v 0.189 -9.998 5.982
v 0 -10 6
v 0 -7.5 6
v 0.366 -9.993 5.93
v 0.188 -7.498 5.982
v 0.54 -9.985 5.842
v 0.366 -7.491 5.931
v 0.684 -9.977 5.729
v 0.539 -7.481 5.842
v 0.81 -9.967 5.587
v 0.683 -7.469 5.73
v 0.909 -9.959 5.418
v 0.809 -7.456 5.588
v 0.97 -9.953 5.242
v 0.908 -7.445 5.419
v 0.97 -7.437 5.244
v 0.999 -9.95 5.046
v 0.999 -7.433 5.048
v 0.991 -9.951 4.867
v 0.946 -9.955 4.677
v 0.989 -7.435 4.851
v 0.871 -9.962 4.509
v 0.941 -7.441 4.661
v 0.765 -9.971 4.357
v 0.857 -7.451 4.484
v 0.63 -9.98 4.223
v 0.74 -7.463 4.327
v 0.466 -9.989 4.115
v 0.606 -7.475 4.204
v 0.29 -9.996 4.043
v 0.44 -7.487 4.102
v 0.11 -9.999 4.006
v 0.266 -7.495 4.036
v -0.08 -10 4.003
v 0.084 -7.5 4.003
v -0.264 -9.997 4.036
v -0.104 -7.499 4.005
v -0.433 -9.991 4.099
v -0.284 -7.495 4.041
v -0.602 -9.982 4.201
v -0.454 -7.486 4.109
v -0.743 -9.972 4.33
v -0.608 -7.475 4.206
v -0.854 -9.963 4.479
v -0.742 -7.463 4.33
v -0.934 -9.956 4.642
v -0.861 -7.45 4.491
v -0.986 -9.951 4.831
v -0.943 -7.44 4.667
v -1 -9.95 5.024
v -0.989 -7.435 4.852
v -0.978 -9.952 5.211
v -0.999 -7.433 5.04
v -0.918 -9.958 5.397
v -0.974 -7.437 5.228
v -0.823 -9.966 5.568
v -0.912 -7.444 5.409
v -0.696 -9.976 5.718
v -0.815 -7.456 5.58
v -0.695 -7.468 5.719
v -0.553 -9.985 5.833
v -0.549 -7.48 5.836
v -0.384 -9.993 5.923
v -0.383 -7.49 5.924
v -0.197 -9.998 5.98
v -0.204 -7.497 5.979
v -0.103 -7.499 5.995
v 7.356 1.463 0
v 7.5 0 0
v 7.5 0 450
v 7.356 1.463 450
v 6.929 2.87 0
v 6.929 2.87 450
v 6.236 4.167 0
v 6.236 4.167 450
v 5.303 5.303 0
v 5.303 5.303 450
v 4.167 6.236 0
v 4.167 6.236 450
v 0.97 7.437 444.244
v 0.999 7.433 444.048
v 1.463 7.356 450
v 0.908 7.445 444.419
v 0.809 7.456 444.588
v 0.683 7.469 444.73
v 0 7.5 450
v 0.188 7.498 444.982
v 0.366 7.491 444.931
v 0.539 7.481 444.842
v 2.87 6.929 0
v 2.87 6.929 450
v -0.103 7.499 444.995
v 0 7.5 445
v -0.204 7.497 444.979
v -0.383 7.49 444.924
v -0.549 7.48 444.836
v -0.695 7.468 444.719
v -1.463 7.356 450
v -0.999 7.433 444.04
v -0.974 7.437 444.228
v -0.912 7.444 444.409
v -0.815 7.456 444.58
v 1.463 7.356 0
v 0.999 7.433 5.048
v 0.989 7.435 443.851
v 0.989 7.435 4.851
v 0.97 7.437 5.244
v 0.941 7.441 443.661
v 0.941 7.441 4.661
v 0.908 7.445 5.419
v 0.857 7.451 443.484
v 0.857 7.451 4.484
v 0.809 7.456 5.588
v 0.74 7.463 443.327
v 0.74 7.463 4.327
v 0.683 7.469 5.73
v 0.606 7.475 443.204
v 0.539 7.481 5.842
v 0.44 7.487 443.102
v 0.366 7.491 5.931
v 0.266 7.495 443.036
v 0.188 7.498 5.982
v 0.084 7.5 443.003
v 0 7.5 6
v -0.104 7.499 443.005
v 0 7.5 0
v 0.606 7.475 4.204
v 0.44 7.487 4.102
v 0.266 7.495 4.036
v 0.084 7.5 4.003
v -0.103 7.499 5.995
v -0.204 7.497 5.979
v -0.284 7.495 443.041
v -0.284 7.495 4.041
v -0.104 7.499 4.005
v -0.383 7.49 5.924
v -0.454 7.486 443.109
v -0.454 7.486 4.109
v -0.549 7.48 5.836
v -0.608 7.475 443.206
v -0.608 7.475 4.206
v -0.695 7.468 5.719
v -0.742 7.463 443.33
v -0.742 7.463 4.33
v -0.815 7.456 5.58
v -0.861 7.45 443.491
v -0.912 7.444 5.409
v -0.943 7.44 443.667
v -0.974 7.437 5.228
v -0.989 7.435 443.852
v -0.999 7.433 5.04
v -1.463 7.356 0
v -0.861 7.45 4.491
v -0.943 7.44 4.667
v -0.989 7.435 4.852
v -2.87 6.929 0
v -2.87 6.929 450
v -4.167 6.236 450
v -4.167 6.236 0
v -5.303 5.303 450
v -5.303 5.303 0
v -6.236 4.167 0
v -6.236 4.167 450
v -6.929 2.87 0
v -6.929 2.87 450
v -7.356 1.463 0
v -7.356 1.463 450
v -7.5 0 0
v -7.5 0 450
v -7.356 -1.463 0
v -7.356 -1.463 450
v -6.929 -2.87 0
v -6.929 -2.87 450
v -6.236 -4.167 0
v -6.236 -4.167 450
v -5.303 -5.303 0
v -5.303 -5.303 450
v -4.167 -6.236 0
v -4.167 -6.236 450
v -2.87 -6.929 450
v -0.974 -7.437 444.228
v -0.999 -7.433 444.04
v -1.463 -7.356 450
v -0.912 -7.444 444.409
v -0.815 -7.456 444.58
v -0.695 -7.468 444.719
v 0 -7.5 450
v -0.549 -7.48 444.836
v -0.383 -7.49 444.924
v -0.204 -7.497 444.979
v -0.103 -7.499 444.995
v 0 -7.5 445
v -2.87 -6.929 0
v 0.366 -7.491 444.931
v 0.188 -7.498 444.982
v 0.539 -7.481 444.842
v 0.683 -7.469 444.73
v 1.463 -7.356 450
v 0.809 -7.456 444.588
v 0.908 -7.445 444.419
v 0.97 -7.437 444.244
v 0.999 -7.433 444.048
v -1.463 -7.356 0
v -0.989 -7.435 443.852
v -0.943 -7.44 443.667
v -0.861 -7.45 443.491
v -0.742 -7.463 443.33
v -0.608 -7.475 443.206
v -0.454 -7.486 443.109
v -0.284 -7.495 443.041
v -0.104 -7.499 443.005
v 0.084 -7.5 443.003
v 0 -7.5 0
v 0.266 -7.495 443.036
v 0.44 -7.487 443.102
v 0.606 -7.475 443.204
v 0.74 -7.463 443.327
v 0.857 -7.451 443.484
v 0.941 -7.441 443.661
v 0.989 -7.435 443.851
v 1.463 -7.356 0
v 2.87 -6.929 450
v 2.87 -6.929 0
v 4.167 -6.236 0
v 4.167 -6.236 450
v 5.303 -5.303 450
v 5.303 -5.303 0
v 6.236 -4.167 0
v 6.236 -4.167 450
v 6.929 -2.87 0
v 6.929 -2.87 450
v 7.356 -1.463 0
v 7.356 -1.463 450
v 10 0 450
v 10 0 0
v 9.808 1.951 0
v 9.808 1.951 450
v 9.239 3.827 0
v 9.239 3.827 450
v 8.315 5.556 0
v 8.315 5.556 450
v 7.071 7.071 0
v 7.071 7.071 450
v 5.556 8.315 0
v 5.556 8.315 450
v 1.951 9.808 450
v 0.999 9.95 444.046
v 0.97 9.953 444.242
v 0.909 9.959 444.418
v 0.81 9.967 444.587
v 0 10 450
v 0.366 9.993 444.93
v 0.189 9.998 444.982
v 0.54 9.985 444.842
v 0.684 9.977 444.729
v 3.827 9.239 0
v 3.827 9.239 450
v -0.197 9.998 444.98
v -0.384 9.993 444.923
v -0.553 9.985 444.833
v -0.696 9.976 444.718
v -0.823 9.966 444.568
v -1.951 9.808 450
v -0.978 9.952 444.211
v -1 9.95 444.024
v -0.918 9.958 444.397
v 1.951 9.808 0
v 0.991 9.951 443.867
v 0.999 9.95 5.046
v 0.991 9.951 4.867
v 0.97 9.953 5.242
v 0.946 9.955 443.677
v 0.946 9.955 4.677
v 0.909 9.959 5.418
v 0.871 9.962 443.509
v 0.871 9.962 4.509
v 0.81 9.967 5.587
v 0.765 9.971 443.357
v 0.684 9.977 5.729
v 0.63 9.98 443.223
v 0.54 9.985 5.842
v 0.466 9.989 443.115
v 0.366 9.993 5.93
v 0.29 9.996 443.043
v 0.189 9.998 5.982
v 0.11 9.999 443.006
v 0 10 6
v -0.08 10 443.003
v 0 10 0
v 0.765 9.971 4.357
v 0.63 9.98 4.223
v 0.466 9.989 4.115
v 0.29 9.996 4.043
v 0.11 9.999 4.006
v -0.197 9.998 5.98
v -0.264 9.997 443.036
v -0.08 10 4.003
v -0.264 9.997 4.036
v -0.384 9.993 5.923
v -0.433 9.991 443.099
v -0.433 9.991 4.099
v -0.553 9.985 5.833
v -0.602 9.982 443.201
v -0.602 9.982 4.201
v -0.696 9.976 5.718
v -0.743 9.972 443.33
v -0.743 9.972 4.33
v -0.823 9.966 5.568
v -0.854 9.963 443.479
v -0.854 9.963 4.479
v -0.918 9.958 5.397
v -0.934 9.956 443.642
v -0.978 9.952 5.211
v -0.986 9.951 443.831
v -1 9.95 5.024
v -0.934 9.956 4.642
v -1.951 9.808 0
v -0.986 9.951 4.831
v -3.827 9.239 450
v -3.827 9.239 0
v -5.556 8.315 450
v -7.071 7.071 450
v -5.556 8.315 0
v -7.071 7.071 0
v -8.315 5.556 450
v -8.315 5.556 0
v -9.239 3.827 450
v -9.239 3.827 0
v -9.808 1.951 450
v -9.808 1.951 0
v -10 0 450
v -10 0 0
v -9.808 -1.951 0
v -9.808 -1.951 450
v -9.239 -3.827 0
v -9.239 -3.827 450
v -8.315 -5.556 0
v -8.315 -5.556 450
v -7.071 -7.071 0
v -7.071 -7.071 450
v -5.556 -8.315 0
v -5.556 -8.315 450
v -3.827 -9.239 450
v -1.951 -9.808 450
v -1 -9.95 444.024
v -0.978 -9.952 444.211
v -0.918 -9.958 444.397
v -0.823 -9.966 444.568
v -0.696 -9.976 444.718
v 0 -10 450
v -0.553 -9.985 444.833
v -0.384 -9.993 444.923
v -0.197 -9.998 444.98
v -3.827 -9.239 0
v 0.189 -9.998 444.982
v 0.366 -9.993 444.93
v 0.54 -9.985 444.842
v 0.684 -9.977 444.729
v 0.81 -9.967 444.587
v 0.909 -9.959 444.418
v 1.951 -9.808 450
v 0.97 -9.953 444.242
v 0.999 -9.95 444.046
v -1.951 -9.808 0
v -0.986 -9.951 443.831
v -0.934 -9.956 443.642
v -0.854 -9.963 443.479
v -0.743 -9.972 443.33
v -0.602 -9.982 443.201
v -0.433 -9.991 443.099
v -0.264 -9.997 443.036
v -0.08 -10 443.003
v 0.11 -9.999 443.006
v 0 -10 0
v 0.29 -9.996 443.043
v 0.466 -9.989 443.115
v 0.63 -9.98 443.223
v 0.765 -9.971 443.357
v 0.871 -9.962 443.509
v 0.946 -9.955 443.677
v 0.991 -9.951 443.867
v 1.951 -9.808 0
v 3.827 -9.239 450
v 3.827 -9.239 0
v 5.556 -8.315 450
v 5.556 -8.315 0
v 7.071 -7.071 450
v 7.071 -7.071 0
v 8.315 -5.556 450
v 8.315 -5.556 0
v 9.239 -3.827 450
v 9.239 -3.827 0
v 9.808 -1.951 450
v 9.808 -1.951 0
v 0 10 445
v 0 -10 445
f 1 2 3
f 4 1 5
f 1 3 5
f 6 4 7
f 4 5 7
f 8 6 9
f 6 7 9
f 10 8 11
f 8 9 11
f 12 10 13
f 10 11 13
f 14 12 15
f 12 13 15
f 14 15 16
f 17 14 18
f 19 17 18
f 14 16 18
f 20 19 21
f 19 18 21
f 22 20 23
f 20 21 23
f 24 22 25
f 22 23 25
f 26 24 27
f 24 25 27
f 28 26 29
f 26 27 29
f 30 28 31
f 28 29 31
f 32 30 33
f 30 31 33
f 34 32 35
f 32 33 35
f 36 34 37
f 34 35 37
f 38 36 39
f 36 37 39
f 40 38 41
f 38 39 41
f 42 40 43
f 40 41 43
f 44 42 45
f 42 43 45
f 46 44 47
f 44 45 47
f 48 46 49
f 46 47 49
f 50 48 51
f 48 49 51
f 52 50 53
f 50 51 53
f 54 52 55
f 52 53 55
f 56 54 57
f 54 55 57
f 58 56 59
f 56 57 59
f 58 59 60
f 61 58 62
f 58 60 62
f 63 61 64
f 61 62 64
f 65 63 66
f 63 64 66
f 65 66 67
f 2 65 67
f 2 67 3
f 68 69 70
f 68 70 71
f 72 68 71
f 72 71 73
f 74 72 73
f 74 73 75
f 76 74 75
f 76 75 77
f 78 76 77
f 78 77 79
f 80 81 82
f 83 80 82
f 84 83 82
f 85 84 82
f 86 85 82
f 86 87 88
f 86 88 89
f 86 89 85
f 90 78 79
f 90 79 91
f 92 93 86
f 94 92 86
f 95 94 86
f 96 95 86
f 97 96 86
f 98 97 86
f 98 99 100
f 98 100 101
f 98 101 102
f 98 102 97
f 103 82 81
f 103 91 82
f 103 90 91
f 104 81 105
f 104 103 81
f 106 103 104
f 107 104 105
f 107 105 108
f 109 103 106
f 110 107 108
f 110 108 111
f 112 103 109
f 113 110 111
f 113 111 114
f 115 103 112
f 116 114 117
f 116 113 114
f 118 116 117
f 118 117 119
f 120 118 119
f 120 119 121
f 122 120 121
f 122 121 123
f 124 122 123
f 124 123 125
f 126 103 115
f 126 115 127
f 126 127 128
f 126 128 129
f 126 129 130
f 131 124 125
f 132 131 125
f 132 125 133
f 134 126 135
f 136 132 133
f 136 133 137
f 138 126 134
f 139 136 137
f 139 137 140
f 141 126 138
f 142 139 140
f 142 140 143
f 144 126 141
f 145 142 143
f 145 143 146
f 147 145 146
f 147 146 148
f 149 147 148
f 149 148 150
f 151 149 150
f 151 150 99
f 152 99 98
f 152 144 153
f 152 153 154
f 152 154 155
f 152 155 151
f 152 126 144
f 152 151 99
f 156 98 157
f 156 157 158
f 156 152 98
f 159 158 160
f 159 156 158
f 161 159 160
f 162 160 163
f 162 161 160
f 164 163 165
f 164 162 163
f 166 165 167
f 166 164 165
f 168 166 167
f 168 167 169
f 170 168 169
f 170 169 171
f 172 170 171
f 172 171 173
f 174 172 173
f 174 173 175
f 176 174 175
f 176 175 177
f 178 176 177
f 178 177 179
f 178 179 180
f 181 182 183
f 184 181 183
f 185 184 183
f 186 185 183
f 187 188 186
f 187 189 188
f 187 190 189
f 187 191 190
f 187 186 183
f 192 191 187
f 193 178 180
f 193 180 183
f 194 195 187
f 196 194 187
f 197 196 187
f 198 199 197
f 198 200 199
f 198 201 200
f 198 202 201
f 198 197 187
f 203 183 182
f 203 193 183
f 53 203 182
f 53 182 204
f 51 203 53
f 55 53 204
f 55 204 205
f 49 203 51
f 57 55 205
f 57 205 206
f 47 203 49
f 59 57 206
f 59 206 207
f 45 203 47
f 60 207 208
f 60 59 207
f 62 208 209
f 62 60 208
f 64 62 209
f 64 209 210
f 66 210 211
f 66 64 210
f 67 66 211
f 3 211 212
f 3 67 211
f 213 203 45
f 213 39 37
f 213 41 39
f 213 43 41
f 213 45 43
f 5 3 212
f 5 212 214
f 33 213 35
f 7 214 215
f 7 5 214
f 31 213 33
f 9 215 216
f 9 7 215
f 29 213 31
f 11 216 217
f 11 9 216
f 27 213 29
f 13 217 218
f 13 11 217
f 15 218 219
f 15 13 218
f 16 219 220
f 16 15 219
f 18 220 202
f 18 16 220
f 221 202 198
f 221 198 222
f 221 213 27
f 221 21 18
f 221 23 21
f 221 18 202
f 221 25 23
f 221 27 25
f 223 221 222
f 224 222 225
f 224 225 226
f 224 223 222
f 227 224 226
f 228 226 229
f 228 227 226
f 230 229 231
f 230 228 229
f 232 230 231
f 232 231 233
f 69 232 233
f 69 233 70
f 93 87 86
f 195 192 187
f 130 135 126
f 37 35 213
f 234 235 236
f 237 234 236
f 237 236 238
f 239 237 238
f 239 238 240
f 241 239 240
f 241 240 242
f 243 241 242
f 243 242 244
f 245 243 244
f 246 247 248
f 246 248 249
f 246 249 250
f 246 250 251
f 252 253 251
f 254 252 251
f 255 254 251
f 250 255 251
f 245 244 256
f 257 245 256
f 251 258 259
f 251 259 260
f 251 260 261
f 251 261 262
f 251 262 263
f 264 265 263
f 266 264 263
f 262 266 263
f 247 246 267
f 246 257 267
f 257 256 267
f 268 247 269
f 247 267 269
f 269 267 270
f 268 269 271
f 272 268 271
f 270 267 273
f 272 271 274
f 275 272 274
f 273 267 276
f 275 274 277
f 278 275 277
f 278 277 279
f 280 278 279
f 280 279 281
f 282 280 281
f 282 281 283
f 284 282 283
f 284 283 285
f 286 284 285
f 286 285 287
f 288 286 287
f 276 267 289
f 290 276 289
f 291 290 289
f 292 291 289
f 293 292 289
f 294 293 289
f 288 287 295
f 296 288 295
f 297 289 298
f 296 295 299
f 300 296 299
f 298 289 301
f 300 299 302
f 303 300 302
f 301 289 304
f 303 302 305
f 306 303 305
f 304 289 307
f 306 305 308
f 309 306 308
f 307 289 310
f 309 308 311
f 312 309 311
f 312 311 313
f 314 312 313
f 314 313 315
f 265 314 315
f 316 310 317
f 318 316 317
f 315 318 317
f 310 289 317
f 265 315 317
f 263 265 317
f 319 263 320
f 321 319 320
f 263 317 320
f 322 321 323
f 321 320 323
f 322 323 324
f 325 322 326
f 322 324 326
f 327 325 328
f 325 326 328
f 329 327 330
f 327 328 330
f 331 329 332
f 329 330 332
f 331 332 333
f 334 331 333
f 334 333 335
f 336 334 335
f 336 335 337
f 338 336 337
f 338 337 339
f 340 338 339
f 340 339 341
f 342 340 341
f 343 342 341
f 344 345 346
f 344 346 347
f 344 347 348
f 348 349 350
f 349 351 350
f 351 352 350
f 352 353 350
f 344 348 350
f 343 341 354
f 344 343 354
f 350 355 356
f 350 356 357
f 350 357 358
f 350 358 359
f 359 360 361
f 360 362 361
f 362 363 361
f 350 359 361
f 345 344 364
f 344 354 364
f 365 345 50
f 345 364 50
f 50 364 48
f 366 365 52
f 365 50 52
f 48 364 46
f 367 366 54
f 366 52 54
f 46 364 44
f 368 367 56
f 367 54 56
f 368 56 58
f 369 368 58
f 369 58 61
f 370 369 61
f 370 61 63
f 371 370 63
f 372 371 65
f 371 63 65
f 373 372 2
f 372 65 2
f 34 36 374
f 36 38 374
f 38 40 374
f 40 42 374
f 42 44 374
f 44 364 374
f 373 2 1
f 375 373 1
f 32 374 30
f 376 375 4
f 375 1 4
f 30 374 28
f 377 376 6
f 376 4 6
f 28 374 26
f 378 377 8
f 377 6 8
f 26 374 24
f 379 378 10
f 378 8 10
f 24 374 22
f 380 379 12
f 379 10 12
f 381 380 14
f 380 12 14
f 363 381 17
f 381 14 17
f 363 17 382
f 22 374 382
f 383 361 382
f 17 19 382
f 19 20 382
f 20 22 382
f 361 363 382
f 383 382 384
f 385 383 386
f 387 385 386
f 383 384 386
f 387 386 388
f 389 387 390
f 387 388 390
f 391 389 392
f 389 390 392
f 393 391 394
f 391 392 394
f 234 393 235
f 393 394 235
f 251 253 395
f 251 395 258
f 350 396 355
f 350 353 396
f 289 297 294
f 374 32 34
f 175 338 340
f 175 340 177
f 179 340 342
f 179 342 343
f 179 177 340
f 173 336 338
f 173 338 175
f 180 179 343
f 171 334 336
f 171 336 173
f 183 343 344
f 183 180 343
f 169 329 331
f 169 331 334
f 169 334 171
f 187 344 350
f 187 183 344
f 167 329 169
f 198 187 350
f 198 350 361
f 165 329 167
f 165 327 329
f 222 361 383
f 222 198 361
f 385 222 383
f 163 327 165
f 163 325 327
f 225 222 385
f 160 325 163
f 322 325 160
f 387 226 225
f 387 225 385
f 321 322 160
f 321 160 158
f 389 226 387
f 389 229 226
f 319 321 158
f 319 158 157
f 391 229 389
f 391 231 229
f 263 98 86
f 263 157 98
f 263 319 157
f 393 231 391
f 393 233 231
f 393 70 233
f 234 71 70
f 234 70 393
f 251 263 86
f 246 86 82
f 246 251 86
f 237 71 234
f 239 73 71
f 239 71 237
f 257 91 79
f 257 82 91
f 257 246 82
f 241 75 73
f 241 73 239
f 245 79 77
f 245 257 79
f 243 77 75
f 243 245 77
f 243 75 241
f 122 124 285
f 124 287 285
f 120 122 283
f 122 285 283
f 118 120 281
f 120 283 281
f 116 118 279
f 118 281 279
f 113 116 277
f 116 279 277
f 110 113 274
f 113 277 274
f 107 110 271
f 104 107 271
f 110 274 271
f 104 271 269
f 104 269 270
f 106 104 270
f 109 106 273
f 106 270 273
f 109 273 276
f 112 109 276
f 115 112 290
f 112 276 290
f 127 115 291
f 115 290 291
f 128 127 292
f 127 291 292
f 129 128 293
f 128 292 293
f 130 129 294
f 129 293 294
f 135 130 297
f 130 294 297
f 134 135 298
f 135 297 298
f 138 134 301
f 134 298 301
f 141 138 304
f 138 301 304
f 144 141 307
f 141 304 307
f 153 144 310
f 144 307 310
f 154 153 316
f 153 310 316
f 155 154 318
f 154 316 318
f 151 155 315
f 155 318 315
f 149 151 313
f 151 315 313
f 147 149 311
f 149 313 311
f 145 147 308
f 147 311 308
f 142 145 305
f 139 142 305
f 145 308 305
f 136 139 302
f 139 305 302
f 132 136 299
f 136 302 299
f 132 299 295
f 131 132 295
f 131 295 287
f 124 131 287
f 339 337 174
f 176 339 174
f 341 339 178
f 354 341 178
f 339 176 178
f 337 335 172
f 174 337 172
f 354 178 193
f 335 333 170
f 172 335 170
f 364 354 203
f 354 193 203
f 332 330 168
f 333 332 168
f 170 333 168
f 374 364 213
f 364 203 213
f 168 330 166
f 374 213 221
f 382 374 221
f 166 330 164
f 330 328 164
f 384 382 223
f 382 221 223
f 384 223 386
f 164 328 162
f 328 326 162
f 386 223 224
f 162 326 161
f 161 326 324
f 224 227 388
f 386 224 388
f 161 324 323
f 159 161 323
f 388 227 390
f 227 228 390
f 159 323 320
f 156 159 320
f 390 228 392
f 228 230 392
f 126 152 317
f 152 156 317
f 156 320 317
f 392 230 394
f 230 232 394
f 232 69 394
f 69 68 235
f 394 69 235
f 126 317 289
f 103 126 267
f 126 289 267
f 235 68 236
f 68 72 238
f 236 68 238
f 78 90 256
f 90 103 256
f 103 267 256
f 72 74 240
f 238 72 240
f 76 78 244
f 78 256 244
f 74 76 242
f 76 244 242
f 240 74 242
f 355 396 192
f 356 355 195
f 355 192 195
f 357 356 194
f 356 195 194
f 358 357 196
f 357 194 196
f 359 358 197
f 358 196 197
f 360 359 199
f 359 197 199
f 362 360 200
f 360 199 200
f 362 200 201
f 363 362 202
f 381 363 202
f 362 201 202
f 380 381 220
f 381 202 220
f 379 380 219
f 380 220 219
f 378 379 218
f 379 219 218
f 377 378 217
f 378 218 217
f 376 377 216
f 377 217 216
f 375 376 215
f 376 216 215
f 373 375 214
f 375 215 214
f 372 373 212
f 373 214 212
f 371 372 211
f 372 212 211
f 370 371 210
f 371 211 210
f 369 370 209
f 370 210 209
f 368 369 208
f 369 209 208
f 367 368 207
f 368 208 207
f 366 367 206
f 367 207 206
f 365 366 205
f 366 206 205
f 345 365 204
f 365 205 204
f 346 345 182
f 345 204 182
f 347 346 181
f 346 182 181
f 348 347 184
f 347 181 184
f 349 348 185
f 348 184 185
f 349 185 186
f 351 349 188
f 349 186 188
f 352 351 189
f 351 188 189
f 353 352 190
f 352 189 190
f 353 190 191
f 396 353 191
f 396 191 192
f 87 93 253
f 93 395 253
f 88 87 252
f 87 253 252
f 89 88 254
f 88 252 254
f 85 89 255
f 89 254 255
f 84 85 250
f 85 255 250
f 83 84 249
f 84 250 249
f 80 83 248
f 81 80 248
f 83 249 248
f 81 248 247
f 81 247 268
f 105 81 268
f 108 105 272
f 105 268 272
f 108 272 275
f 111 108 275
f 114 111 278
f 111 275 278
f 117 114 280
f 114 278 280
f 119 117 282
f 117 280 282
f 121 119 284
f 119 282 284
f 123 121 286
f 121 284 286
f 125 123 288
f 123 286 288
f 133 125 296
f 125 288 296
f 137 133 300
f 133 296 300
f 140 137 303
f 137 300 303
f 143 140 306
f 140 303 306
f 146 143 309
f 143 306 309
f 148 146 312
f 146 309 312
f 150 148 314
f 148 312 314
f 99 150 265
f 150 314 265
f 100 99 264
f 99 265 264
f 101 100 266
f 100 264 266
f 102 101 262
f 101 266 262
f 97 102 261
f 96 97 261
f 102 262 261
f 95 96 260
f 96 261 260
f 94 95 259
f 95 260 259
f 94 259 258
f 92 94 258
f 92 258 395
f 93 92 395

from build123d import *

# Parameters (mm, degrees)
SKETCH_1_R          = 10
SKETCH_1_R_2        = 7.5
EXTRUDE_1_DEPTH     = 450
SKETCH_2_R          = 1
CUT_EXTRUDE_2_DEPTH = 20
SKETCH_3_R          = 1
CUT_EXTRUDE_3_DEPTH = 20


with BuildPart() as part:
    # Эскиз1 → Вытянуть1 (new body)
    with BuildSketch(Plane.XY):
        Circle(SKETCH_1_R)
        Circle(SKETCH_1_R_2, mode=Mode.SUBTRACT)
    extrude(amount=EXTRUDE_1_DEPTH)

    # Эскиз2 → Вытянуть2 (cut, symmetric)
    with BuildSketch(Plane(origin=(0, 0, 0), x_dir=(1, 0, 0), z_dir=(0, 1, 0))):
        with Locations(Location((0, -5, 0), (0, 0, 270))):
            Circle(SKETCH_2_R)
    extrude(amount=CUT_EXTRUDE_2_DEPTH, both=True, mode=Mode.SUBTRACT)

    # Эскиз3 → Вытянуть3 (cut, symmetric)
    with BuildSketch(Plane(origin=(0, 0, 0), x_dir=(1, 0, 0), z_dir=(0, 1, 0))):
        with Locations(Location((0, -444, 0), (0, 0, 270))):
            Circle(SKETCH_3_R)
    extrude(amount=CUT_EXTRUDE_3_DEPTH, both=True, mode=Mode.SUBTRACT)


solid = part.part
